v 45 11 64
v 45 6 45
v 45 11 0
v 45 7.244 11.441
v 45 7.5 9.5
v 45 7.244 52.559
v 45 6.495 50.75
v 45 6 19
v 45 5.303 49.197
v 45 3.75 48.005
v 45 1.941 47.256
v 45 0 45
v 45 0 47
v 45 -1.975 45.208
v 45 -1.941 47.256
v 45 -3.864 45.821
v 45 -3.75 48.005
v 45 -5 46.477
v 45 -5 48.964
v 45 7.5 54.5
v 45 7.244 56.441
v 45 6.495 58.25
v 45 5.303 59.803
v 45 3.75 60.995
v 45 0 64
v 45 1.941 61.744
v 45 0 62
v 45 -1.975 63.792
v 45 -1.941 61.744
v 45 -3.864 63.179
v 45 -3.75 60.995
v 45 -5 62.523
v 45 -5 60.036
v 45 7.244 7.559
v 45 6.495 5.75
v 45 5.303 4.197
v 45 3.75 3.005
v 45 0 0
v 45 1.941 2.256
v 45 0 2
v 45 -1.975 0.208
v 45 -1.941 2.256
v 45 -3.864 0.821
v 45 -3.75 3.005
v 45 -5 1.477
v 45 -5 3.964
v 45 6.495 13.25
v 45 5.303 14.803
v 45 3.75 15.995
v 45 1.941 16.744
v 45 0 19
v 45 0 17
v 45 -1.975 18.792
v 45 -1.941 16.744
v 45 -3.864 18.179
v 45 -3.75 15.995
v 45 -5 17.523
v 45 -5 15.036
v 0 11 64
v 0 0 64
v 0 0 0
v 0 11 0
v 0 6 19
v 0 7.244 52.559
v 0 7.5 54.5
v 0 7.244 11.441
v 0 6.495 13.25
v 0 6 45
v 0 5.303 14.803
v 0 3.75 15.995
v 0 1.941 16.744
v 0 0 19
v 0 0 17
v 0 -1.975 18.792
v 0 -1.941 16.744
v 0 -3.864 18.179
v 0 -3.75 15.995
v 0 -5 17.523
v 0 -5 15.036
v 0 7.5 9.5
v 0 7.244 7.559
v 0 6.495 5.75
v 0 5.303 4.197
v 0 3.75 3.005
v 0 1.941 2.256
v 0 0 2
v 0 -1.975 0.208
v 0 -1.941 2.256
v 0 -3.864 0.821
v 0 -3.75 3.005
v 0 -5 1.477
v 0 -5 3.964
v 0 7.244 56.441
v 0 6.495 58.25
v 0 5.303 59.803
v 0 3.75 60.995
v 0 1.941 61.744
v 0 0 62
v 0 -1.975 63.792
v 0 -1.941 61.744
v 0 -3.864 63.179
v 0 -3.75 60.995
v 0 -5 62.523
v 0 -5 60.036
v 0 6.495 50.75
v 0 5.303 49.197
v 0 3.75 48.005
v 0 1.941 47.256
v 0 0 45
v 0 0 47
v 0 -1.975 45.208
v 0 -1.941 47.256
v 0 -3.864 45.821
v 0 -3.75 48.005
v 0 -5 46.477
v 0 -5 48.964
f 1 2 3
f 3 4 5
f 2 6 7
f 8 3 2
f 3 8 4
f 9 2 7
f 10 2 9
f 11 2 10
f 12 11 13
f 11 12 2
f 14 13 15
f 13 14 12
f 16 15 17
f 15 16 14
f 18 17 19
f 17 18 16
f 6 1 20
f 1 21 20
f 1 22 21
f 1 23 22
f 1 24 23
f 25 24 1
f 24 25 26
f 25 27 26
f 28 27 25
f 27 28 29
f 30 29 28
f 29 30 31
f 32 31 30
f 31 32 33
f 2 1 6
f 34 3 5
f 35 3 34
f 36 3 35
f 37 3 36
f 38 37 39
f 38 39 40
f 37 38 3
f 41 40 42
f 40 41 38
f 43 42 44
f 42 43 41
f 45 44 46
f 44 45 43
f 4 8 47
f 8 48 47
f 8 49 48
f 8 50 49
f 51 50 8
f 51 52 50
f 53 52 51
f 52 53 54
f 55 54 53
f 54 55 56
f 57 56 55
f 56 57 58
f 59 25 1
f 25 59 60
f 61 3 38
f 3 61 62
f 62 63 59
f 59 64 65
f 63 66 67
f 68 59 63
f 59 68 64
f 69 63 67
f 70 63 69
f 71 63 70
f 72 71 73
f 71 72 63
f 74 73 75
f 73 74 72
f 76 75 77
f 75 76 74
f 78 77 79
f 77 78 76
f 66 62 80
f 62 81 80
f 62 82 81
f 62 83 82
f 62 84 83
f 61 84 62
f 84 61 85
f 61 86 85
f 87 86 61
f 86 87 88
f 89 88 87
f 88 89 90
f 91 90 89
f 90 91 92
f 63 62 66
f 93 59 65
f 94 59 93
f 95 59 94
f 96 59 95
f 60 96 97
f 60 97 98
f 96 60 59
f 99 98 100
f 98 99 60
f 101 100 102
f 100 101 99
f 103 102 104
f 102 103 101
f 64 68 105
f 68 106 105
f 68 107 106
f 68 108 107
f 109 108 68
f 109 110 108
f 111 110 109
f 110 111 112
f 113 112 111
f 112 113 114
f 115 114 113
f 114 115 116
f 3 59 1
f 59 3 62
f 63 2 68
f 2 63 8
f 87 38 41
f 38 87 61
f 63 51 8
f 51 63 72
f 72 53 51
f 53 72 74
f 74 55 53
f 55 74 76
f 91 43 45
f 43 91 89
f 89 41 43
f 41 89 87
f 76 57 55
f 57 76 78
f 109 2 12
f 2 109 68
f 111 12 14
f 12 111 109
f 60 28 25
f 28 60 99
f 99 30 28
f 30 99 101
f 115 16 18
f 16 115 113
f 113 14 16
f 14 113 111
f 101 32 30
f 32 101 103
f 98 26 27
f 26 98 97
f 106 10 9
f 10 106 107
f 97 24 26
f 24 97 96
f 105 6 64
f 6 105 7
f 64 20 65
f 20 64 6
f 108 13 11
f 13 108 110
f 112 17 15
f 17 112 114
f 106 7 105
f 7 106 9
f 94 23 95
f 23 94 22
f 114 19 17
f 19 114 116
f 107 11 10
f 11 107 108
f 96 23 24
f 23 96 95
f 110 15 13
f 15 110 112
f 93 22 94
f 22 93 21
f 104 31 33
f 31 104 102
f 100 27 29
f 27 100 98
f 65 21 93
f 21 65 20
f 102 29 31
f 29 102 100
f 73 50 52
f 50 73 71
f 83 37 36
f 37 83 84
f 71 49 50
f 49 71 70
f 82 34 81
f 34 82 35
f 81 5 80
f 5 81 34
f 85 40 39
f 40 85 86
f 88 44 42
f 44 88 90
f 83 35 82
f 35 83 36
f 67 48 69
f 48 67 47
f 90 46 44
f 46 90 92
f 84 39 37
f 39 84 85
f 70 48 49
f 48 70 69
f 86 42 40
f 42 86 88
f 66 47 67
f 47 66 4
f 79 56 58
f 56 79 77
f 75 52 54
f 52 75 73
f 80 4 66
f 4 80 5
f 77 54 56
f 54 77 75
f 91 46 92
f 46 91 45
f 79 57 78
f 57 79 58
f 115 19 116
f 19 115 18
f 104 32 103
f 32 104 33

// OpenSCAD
module bearing_trap(outer=17, width=50){
    hull(){
        cylinder(d=outer, h=width);
        translate([-outer/2, 4, 0]) cube([outer, 5, width]);
    }
}

module x_carriage(width=45, height=64, bearing=15){
    rod_distance = 45;
    rod_offset = (height-rod_distance) / 2;
    difference() {
        union() {
            translate([0, 6, 0]) cube([width, 5, height]);
            translate([0, 0, rod_offset]) rotate([0, 90, 0]) bearing_trap(outer=bearing+4, width=width);
            translate([0, 0, height - rod_offset]) rotate([0, 90, 0]) bearing_trap(outer=bearing+4, width=width);
        }
        union() {
            translate([0, 0, height - rod_offset]) rotate([0, 90, 0]) cylinder(d=bearing, h=width);
            translate([0, 0, rod_offset]) rotate([0, 90, 0]) cylinder(d=bearing, h=width);
            translate([0, -10, 0]) cube([width, 5, 70]);
        }
    }
}
//bearing_trap();
x_carriage();
